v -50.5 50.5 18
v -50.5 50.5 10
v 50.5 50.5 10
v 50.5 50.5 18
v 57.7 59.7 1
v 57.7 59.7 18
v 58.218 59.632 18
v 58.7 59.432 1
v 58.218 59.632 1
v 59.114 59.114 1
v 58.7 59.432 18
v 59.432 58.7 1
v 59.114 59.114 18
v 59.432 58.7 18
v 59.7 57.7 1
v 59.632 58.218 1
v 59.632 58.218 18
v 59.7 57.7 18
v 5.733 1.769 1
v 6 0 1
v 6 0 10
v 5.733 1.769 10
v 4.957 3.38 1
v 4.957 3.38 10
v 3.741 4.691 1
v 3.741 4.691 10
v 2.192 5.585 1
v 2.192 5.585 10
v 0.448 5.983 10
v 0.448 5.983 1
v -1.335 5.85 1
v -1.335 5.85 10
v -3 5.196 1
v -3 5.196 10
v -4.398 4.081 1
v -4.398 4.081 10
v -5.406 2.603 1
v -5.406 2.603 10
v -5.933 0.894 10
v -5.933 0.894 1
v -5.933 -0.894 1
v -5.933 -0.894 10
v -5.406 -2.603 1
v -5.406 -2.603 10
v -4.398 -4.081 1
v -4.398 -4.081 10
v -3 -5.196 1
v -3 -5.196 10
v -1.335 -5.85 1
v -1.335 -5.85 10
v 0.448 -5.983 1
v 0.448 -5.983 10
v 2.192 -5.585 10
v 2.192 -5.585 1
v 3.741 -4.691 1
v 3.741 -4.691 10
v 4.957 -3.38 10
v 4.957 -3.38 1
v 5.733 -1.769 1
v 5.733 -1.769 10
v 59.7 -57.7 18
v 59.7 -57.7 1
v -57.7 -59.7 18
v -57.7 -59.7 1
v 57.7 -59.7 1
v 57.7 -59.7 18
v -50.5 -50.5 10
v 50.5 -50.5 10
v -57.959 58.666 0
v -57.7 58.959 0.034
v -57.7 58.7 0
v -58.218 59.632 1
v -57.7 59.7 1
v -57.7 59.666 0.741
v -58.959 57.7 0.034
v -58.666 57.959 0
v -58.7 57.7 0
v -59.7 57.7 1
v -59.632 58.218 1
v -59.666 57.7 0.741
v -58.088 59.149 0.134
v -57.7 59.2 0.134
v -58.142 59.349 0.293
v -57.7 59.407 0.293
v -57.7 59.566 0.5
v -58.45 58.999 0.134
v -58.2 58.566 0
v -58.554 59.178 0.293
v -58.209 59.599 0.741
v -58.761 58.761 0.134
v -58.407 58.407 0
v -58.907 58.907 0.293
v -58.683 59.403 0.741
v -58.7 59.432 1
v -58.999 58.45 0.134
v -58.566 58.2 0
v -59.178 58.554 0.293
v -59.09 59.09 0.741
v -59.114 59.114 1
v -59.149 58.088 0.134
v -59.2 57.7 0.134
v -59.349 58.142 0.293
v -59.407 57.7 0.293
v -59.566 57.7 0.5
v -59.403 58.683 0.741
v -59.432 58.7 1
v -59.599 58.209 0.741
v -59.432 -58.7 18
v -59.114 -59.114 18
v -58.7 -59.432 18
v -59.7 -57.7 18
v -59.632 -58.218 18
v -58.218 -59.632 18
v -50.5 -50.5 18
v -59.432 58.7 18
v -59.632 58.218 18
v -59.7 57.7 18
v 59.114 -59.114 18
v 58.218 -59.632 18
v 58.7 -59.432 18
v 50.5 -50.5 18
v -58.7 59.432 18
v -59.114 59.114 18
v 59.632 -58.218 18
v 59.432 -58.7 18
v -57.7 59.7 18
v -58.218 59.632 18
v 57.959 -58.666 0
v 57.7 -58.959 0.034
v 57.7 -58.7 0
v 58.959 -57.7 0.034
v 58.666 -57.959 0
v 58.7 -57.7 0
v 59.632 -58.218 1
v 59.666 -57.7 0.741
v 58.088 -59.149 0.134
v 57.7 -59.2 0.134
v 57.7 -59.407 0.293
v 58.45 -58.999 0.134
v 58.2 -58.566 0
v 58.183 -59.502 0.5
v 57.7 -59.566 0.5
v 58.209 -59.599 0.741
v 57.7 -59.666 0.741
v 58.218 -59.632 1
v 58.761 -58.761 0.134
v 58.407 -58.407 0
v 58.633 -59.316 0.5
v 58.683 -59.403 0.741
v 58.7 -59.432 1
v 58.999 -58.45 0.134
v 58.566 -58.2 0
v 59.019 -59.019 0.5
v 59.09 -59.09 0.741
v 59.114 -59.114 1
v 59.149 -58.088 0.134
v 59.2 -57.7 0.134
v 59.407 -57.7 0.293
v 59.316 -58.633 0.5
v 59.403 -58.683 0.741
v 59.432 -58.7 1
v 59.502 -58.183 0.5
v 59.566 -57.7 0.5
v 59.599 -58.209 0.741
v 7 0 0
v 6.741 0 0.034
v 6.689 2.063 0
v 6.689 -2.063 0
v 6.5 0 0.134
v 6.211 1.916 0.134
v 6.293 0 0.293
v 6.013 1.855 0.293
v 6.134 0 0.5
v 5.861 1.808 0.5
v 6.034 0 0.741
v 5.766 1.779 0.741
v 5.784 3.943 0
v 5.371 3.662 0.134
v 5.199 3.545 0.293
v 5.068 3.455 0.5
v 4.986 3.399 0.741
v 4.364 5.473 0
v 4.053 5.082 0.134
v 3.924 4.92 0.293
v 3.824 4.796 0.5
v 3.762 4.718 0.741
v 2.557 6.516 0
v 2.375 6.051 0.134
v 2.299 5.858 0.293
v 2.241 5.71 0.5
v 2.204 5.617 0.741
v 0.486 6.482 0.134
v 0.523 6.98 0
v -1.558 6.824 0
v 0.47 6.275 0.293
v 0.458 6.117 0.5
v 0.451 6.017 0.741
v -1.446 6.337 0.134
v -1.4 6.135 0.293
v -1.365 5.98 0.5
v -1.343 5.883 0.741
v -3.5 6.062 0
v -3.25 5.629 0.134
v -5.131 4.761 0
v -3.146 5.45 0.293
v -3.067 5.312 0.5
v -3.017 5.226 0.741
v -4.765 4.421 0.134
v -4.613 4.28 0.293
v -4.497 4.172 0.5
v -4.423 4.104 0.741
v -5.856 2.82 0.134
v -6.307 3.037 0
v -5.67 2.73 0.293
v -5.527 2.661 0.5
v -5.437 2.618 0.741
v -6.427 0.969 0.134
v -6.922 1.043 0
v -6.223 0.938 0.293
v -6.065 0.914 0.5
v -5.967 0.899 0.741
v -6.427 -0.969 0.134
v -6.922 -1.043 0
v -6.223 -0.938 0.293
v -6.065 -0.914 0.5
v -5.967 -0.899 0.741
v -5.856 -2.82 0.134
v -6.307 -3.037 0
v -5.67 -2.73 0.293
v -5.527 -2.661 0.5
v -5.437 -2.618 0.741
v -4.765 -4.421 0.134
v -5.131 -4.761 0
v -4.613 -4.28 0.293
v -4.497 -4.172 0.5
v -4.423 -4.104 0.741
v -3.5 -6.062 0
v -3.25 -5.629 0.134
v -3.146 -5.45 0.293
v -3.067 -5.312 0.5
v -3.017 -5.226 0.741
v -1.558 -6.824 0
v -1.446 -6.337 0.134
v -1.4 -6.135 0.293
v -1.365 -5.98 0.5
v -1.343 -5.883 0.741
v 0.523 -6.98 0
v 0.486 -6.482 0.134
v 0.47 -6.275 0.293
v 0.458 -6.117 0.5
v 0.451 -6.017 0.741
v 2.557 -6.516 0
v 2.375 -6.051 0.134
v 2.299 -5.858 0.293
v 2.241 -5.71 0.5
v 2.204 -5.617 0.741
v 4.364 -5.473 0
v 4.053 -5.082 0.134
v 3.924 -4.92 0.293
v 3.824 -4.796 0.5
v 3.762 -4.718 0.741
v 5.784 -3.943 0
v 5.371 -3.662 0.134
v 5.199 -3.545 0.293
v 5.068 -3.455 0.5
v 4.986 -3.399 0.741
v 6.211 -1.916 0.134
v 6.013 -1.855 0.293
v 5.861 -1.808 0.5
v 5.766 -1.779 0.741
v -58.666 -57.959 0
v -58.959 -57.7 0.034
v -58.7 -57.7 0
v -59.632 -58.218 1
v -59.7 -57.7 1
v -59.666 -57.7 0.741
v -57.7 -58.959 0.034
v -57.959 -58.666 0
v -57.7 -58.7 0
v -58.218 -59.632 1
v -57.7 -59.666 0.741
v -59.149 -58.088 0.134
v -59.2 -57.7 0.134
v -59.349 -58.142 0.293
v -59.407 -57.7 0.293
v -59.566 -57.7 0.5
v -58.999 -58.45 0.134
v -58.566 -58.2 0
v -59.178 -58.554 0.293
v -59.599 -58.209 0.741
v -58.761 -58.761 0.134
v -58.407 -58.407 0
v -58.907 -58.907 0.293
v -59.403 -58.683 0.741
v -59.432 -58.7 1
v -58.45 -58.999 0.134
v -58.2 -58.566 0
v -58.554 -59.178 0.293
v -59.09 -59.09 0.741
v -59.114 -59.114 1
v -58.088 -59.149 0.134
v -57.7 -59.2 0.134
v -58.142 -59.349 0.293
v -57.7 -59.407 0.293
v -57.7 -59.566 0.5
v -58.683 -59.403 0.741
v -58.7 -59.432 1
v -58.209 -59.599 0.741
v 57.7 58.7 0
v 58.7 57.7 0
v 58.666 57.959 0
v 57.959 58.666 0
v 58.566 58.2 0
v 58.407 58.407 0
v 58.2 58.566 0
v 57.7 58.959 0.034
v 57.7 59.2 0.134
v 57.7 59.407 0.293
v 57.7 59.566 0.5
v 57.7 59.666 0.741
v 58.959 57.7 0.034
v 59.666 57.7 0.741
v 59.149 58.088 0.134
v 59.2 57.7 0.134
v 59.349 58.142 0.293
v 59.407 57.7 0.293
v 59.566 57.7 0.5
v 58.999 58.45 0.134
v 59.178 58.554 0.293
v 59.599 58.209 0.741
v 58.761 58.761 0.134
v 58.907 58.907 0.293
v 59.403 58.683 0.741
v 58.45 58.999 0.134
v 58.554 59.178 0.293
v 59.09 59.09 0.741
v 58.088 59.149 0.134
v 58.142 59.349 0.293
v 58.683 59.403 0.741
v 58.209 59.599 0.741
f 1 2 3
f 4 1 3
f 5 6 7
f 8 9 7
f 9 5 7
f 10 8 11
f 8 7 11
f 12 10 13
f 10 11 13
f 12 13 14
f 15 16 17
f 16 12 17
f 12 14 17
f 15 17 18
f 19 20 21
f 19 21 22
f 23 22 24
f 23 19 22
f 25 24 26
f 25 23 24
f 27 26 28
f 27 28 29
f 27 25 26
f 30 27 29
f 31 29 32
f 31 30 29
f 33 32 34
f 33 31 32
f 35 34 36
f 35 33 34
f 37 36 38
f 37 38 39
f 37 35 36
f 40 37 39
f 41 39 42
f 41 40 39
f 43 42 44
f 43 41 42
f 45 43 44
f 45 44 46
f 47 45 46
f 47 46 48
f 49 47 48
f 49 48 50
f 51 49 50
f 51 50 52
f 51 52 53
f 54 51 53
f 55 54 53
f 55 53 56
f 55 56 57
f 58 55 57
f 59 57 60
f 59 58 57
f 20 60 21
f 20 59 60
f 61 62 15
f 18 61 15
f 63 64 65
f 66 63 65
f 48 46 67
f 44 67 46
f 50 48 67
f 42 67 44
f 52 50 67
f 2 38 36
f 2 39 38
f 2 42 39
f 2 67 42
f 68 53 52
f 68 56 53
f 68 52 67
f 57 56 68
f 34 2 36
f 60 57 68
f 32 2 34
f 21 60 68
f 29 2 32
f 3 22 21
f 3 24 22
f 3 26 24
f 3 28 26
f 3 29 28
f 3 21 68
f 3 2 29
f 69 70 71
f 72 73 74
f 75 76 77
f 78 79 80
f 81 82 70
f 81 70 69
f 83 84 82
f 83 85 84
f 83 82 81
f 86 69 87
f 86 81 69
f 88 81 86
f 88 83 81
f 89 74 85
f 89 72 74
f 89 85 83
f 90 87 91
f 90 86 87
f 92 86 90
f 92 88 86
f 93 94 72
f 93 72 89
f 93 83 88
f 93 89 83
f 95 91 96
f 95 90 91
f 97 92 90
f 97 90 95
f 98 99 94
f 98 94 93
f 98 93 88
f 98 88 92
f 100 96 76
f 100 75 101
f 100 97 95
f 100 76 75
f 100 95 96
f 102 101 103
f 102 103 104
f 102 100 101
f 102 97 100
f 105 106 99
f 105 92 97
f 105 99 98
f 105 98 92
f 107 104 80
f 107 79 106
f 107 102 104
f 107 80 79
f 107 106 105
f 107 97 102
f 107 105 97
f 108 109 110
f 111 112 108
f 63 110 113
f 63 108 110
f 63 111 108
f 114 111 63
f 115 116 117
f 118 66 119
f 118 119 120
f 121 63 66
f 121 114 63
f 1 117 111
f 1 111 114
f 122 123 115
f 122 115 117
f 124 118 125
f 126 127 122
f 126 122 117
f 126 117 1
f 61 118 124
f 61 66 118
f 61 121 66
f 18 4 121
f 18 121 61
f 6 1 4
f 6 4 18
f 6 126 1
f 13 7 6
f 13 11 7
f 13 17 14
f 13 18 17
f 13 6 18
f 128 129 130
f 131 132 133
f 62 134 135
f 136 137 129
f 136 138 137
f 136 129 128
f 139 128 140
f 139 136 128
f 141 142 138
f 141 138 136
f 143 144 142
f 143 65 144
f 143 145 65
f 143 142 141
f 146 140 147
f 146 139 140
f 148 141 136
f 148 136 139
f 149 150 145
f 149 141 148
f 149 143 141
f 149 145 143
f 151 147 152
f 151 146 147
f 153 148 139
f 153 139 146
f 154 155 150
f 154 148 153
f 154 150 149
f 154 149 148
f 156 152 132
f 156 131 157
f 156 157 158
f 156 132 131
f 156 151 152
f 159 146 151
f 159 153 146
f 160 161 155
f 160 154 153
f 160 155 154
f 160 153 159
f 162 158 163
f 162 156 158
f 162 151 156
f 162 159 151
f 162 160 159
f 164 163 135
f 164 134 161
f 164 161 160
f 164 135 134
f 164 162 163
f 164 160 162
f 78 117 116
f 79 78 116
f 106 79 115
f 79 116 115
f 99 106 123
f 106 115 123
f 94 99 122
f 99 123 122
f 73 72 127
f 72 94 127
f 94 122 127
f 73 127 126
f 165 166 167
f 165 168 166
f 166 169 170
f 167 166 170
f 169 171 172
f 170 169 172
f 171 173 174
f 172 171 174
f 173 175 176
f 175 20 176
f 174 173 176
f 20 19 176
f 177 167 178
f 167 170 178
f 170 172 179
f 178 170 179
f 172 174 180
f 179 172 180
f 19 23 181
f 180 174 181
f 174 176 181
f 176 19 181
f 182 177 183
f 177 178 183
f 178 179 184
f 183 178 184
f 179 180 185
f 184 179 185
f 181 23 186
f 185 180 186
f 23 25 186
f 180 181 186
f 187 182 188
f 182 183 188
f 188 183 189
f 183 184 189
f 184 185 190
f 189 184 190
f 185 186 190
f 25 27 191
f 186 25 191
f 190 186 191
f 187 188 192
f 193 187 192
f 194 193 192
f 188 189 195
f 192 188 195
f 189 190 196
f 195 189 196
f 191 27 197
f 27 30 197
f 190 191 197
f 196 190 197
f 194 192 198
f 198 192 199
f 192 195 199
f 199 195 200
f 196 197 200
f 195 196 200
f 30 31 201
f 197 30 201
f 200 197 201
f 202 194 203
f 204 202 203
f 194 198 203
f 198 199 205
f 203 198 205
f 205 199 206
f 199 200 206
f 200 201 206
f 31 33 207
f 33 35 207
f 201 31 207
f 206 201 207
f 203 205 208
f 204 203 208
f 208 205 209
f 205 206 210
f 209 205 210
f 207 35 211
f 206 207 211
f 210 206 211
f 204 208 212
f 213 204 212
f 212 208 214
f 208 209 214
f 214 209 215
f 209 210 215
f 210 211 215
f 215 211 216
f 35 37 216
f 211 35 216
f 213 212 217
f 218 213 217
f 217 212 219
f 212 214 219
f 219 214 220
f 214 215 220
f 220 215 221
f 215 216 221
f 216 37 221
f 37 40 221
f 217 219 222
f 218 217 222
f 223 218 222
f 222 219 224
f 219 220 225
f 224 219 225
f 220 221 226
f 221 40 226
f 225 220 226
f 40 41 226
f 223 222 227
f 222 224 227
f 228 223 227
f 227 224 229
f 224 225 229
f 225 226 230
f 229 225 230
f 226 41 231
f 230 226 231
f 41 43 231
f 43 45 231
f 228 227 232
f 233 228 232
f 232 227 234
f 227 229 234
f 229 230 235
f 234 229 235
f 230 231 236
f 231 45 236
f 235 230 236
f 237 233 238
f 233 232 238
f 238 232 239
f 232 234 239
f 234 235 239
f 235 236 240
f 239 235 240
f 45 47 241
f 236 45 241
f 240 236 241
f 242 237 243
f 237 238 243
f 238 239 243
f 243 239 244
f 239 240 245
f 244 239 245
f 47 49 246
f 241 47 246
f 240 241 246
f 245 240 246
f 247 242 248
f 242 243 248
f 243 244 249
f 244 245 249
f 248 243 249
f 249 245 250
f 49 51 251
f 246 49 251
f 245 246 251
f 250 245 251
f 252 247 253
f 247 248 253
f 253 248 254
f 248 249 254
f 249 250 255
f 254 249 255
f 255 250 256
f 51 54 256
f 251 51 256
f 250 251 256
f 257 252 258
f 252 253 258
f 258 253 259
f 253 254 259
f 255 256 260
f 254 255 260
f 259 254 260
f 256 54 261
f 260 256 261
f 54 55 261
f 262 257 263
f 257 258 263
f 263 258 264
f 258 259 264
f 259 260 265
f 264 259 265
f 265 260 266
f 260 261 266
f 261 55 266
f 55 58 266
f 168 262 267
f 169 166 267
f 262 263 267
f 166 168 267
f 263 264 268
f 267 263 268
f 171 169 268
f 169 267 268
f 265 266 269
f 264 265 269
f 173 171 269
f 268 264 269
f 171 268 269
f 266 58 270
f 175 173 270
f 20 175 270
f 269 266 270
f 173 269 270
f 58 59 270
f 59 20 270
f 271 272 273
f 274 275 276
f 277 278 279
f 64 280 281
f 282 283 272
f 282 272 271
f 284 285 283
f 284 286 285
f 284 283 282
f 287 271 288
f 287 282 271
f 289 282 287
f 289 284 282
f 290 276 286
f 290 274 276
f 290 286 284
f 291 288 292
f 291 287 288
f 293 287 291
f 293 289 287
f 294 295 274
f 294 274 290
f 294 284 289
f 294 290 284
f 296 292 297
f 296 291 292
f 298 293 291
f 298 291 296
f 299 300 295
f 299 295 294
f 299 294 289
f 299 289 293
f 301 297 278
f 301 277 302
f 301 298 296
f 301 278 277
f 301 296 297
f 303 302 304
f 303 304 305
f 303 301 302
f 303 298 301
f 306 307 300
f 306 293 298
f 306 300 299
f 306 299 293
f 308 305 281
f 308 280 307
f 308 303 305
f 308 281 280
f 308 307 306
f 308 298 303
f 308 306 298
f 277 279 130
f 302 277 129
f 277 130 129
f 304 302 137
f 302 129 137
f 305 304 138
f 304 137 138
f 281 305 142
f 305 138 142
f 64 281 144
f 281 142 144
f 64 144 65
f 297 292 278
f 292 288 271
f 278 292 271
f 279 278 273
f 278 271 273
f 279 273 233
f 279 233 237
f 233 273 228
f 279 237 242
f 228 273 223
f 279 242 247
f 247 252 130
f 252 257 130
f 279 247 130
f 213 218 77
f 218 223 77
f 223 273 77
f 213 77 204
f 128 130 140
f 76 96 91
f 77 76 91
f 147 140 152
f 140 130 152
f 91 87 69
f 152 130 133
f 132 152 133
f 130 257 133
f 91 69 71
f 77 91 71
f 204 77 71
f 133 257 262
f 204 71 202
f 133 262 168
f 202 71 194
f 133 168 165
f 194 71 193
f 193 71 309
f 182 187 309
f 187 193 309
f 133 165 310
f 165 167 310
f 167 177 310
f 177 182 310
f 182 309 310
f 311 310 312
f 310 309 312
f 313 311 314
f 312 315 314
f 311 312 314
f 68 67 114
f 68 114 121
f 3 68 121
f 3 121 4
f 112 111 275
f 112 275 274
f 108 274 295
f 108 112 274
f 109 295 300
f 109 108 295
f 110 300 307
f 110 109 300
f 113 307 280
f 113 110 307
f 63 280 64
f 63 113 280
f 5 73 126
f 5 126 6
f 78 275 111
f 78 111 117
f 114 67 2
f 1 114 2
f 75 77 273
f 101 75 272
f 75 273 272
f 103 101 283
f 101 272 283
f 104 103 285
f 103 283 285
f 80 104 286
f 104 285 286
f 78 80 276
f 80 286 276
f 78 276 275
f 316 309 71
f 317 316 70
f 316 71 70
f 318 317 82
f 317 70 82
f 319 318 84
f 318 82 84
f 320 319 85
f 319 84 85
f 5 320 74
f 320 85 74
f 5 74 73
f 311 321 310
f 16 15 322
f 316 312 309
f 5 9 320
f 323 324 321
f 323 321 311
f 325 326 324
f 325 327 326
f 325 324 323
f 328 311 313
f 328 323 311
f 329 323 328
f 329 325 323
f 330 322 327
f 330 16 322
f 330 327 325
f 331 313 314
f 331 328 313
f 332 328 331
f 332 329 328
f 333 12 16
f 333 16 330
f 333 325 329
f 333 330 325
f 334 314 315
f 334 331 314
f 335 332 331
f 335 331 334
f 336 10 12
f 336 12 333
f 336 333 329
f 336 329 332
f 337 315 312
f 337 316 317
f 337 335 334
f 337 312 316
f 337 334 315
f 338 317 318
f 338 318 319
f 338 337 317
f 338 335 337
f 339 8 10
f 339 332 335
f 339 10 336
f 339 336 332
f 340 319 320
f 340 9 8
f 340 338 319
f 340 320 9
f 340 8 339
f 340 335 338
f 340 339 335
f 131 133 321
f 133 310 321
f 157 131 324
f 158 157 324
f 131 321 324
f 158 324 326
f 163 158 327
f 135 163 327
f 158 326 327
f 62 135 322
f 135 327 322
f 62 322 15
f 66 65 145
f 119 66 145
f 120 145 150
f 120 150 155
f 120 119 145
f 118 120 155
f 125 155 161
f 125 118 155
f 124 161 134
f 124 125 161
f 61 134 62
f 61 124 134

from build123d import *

# Parameters (mm, degrees)
F0_W     = 101
F0_H     = 101
F0_R     = 6
F1_DEPTH = 10
F0_W_2   = 119.4
F0_H_2   = 119.4
F2_DEPTH = 18
F3_R     = 2
F4_R     = 1


with BuildPart() as f1:
    # F0 (on Top) → F1 (new body)
    with BuildSketch(Plane.XY):
        Rectangle(F0_W, F0_H)
        Circle(F0_R, mode=Mode.SUBTRACT)
    extrude(amount=F1_DEPTH)

    # F0 (on Top) → F2 (join)
    with BuildSketch(Plane.XY):
        Rectangle(F0_W_2, F0_H_2)
        Rectangle(F0_W, F0_H, mode=Mode.SUBTRACT)
    extrude(amount=F2_DEPTH)

    # F3
    f3_edges = [f1.edges().sort_by_distance(p)[0] for p in [
        (-59.7, -59.7, 9),
        (59.7, -59.7, 9),
        (59.7, 59.7, 9),
        (-59.7, 59.7, 9),
    ]]
    fillet(f3_edges, radius=F3_R)

    # F4
    f4_edges = [f1.edges().sort_by_distance(p)[0] for p in [
        (59.7, 0, 0),
        (59.114214, -59.114214, 0),
        (59.114214, 59.114214, 0),
        (0, -59.7, 0),
        (0, 59.7, 0),
        (-59.114214, -59.114214, 0),
        (-59.114214, 59.114214, 0),
        (-59.7, 0, 0),
        (-6, 0, 0),
    ]]
    fillet(f4_edges, radius=F4_R)


solid = f1.part
